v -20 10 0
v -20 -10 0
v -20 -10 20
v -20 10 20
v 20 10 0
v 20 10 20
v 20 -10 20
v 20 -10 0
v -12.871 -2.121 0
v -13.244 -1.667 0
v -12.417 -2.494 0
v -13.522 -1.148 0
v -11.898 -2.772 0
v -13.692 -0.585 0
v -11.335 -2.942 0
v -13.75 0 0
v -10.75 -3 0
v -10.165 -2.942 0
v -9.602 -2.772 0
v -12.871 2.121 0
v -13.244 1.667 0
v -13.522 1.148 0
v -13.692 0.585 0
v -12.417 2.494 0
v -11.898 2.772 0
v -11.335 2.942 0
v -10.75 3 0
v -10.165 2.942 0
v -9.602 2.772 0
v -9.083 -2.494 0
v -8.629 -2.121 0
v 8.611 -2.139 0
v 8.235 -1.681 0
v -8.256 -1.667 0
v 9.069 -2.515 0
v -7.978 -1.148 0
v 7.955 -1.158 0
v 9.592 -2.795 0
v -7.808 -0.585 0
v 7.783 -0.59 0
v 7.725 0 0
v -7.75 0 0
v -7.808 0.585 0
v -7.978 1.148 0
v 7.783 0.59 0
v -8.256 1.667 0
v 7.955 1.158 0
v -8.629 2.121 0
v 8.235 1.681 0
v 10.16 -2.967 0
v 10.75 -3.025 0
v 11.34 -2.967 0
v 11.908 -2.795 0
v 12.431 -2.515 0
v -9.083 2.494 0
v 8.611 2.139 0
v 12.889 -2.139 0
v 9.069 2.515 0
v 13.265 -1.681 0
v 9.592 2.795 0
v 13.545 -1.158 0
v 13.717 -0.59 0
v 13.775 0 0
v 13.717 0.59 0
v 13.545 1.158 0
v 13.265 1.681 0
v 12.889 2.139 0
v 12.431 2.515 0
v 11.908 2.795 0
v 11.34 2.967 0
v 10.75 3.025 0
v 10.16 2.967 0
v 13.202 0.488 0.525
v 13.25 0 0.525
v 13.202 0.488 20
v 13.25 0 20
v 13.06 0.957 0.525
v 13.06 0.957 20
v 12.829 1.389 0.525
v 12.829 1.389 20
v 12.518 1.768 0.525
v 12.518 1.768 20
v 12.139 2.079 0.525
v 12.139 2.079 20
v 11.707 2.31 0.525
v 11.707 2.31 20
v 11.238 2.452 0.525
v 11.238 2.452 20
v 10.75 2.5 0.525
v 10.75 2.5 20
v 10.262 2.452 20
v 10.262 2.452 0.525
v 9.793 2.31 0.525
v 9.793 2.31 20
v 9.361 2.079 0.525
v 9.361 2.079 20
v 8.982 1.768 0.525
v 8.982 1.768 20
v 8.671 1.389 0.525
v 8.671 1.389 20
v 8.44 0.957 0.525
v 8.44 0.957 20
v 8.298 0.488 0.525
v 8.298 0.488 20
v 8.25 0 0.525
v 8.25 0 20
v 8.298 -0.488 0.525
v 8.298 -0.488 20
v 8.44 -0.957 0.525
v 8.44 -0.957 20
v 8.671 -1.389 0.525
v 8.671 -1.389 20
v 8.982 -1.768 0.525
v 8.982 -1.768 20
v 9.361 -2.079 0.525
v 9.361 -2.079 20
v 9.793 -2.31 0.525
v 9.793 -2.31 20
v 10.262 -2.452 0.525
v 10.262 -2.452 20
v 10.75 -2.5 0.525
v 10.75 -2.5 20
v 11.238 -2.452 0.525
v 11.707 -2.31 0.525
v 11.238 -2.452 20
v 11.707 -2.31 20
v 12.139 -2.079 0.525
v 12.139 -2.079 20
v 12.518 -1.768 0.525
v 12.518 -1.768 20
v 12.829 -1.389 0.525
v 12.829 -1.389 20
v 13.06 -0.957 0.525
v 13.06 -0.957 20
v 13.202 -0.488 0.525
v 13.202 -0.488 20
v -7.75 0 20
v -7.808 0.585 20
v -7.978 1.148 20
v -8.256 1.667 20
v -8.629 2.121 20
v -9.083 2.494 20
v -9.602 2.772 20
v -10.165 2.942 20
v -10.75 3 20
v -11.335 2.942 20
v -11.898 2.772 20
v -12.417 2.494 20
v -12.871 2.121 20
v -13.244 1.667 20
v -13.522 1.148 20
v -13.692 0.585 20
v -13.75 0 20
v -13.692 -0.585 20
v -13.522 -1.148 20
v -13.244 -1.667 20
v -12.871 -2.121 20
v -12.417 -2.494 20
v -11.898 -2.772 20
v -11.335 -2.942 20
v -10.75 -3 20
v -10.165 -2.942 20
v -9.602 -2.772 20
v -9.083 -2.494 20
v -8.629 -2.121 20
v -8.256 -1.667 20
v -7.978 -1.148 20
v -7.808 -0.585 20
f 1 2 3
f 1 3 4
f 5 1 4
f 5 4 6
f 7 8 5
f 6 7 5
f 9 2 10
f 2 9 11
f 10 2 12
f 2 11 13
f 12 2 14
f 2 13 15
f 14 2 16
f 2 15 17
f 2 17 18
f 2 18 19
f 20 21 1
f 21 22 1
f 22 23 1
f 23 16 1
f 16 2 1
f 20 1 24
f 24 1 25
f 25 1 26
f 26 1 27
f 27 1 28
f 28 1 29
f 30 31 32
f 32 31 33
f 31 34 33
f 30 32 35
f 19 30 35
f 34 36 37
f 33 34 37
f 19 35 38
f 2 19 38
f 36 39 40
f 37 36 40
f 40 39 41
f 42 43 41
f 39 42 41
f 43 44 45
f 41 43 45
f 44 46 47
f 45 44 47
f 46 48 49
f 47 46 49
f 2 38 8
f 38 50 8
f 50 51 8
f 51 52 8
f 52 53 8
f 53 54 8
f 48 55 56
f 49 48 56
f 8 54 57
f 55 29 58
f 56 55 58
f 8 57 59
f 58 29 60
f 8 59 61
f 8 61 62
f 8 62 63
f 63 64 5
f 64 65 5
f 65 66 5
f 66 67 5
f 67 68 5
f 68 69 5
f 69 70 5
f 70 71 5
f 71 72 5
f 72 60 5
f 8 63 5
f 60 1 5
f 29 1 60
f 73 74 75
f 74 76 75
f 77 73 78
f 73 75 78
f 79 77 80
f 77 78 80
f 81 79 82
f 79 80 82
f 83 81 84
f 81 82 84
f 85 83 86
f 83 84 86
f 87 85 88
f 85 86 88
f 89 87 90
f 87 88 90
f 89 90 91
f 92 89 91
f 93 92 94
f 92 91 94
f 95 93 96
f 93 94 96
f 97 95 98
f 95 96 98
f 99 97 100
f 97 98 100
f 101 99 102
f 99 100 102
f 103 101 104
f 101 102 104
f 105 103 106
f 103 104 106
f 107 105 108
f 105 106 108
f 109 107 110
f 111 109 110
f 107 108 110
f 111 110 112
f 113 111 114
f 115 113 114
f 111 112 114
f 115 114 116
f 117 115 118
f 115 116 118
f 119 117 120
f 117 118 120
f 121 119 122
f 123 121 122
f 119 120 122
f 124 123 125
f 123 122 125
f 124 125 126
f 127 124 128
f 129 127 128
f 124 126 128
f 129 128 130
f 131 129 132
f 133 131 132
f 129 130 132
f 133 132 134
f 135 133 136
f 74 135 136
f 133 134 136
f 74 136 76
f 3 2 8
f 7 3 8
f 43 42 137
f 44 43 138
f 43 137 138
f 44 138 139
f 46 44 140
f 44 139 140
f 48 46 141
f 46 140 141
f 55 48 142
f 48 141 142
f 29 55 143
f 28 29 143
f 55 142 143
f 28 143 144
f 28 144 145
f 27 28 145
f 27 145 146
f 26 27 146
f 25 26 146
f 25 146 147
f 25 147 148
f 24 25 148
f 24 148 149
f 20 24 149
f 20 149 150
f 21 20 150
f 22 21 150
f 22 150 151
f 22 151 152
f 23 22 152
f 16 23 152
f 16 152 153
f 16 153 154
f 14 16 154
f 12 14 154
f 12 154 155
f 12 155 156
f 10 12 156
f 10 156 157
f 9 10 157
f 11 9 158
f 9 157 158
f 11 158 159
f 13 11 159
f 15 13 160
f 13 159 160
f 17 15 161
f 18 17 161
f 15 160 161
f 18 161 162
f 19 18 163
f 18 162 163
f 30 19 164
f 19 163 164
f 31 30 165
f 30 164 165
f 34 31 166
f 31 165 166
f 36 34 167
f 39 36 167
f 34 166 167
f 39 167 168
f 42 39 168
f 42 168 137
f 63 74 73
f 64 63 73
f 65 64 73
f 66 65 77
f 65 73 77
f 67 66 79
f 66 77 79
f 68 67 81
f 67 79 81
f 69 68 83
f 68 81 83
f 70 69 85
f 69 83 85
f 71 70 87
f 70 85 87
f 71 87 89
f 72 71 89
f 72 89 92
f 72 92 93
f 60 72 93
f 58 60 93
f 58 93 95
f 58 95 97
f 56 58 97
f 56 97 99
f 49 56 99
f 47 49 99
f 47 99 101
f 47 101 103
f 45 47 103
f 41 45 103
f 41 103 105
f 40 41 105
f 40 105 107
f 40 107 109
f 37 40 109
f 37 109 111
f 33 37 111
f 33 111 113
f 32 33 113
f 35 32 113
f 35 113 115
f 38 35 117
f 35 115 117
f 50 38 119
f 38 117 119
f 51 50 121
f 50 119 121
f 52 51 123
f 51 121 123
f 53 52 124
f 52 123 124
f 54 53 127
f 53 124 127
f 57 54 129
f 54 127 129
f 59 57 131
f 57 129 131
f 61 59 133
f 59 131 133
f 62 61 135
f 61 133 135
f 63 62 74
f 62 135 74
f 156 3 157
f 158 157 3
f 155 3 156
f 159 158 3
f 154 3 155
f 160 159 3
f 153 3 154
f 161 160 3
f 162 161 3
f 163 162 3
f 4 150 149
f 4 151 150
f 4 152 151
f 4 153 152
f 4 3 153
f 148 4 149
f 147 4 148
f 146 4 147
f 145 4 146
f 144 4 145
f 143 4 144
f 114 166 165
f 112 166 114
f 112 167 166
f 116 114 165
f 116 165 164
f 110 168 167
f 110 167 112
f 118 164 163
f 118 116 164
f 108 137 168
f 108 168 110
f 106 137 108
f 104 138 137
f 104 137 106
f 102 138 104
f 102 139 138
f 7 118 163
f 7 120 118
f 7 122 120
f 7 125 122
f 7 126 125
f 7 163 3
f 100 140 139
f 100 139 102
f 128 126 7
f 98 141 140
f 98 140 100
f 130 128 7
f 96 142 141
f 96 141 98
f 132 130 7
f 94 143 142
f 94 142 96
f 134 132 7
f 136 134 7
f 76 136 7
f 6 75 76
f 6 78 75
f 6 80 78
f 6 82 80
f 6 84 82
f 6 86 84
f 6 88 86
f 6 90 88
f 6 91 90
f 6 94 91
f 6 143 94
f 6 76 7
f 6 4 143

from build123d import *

# Parameters (mm, degrees)
SKETCH_1_W                   = 40
SKETCH_1_H                   = 20
EXTRUDE_1_DEPTH              = 20
HOLE_WIZARD_M6_1_D           = 5
HOLE_WIZARD_M6_1_CSINK_D     = 6.05
HOLE_WIZARD_M6_1_CSINK_ANGLE = 90
SKETCH_3_R                   = 3
CUT_EXTRUDE_1_DEPTH          = 31


with BuildPart() as part:
    # 草图1 → 凸台-拉伸1 (new body)
    with BuildSketch(Plane.XY):
        Rectangle(SKETCH_1_W, SKETCH_1_H)
    extrude(amount=EXTRUDE_1_DEPTH)

    # M6 螺纹孔1 (through all)
    with Locations(Plane(origin=(10.75, 0, 0), x_dir=(-1, 0, 0), z_dir=(0, 0, -1))):
        with Locations((0, 0)):
            CounterSinkHole(HOLE_WIZARD_M6_1_D / 2, HOLE_WIZARD_M6_1_CSINK_D / 2, counter_sink_angle=HOLE_WIZARD_M6_1_CSINK_ANGLE)

    # 草图3 → 切除-拉伸1 (cut, through all)
    with BuildSketch(Plane.XY.offset(20)):
        with Locations((-10.75, 0)):
            Circle(SKETCH_3_R)
    extrude(amount=-CUT_EXTRUDE_1_DEPTH, mode=Mode.SUBTRACT)


solid = part.part
